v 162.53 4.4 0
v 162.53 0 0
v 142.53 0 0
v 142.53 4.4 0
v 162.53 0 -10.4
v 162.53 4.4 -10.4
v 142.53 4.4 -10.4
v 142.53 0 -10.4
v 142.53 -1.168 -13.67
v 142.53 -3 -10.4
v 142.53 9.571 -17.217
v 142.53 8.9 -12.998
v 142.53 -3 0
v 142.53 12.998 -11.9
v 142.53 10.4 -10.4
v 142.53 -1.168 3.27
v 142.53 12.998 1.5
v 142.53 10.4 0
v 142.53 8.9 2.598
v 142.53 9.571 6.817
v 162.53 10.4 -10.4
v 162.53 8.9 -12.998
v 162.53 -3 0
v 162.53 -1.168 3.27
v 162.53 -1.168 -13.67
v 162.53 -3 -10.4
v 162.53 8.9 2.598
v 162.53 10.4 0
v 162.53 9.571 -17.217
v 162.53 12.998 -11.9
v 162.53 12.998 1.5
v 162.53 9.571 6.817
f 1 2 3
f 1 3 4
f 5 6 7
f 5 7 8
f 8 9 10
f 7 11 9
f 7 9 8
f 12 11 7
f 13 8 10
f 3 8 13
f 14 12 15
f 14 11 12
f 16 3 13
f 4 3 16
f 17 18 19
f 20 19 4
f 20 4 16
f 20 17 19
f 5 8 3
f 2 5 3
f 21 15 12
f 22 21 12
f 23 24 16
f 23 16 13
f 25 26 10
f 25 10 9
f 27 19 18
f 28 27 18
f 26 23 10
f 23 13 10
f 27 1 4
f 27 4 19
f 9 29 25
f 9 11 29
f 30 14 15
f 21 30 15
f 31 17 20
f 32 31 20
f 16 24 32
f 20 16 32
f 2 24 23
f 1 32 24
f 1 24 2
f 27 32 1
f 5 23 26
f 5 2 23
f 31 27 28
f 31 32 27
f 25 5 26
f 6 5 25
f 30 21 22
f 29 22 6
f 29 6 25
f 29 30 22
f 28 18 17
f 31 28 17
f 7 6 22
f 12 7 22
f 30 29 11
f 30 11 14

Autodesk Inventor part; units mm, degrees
ref_plane "YZ Plane" through (0, 0, 0) normal (1, 0, 0) x (0, 1, 0)
ref_plane "XZ Plane" through (0, 0, 0) normal (0, 1, 0) x (-1, 0, 0)
ref_plane "XY Plane" through (0, 0, 0) normal (0, 0, 1) x (1, 0, 0)
sketch "Эскиз8" plane through (0, 0, 0) normal (1, 0, 0) x (0, 1, 0)
  line L0 (0, 0) -> (10.4, 0)
  line L1 (10.4, 0) -> (10.4, -10.4)
  line L2 (10.4, -10.4) -> (0, -10.4)
  line L3 (0, -10.4) -> (0, 0)
  line L4 (5.2, 0) -> (5.2, 4)
  line L5 (5.2, -10.4) -> (5.2, -14.4)
  circle A0 centre (5.2, 4) radius 1.6
  circle A1 centre (5.2, -14.4) radius 1.6
  line L6 (5.2, 4) -> (7.9, 4)
  line L7 (7.9, 2.4412) -> (5.2, 0.8823)
  line L8 (5.2, 0.8823) -> (2.5, 2.4412)
  line L9 (2.5, 2.4412) -> (2.5, 5.5588)
  line L10 (2.5, 5.5588) -> (5.2, 7.1177)
  line L11 (5.2, 7.1177) -> (7.9, 5.5588)
  line L12 (7.9, 5.5588) -> (7.9, 2.4412)
  line L13 (7.9, -15.9588) -> (5.2, -17.5177)
  line L14 (5.2, -17.5177) -> (2.5, -15.9588)
  line L15 (2.5, -15.9588) -> (2.5, -12.8412)
  line L16 (2.5, -12.8412) -> (5.2, -11.2823)
  line L17 (5.2, -11.2823) -> (7.9, -12.8412)
  line L18 (7.9, -12.8412) -> (7.9, -15.9588)
  circle A2 centre (5.2, 4) radius 5.2
  circle A3 centre (5.2, -14.4) radius 5.2
  line L19 (10.4, 4) -> (10.4, 0)
  line L20 (10.4, -10.4) -> (10.4, -14.4)
  line L21 (0, -14.4) -> (0, -10.4)
  line L22 (0, 4) -> (0, 0)
  line L23 (7.9, 5.5588) -> (7.9, 8.4441)
  line L24 (2.5, 5.5588) -> (2.5, 8.4441)
  line L25 (2.5, -15.9588) -> (2.5, -18.8441)
  line L26 (7.9, -15.9588) -> (7.9, -18.8441)
  line L27 (0, 0) -> (-3, 0)
  line L28 (-3, 0) -> (-3, -10.4)
  line L29 (-3, -10.4) -> (0, -10.4)
  line L30 (0, -10.4) -> (0, 0)
  line L31 (10.4, 0) -> (8.9, 2.5981)
  line L32 (10.4, -10.4) -> (8.9, -12.9981)
  line L33 (10.4, -10.4) -> (13.4, -10.4) construction
  line L34 (8.9, -12.9981) -> (4.4, -10.4)
  line L35 (8.9, 2.5981) -> (4.4, 0)
  line L36 (-3, 0) -> (0.663, 6.5408)
  line L37 (-3, -10.4) -> (0.663, -16.9408)
  line L38 (10.4, 0) -> (12.9981, 1.5)
  line L39 (12.9981, 1.5) -> (9.5707, 6.8173)
  line L40 (10.4, -10.4) -> (12.9981, -11.9)
  line L41 (12.9981, -11.9) -> (9.5707, -17.2173)
  point P0 (7.9, -14.4)
  dimension "d51" = 10.4
  dimension "d52" = 10.4
  dimension "d53" = 4
  dimension "d54" = 4
  dimension "d55" = 3.2
  dimension "d56" = 3.2
  dimension "d57" = 2.7
  dimension "d58" = 3
  dimension "d59" = 3
  dimension "d60" = 3
  dimension "d61" = 120
  dimension "d62" = 3
  dimension "d63" = 3
extrude "Выдавливание6" add sketch "Эскиз8" along normal blind 5 contours L0 A2 L24 L9 L8 L4 L35 | L0 L22 A2 | L4 L7 L12 L23 A2 L31 L35 | L27 L36 A2 L22 | L3 L29 L28 L27 | L31 A2 L19 | L19 A2 L39 L38 | L2 A3 L21 | L21 A3 L37 L29 | L40 L41 A3 L20 | L20 A3 L32 | L2 L34 L5 L16 L15 L25 A3 | A3 L26 L18 L17 L5 L34 L32
sketch "Эскиз9" plane through (0, 0, 0) normal (-1, 0, 0) x (0, 0, 1)
  arc A0 (-18.8441, 2.5) -> (-16.9408, 0.663) centre (-14.4, 5.2) ccw projected
  circle A1 centre (-14.4, 5.2) radius 5.2
  circle A2 centre (-14.4, 5.2) radius 1.6
  arc A3 (6.5408, 0.663) -> (8.4441, 2.5) centre (4, 5.2) ccw projected
  circle A4 centre (4, 5.2) radius 5.2
  circle A5 centre (4, 5.2) radius 1.6
  line L0 (2.5981, 8.9) -> (0, 10.4) projected
  line L1 (0, 10.4) -> (2.5981, 8.9)
  line L2 (0, 4.4) -> (2.5981, 8.9) projected
  line L3 (2.5981, 8.9) -> (0, 4.4)
  line L4 (0, 0) -> (0, 4.4) projected
  line L5 (0, 4.4) -> (0, 0)
  line L6 (-10.4, 4.4) -> (-10.4, 0) projected
  line L7 (0, 0) -> (-10.4, 0)
  line L8 (-10.4, 0) -> (-10.4, 1.8774)
  line L9 (-10.4, 10.4) -> (-12.9981, 8.9) projected
  line L10 (-11.699, 9.65) -> (-10.4, 10.4)
  line L11 (-11.9, 12.9981) -> (-10.4, 10.4) projected
  line L12 (-10.4, 10.4) -> (-11.9, 12.9981)
  line L13 (-17.2173, 9.5707) -> (-11.9, 12.9981) projected
  line L14 (-11.9, 12.9981) -> (-17.2173, 9.5707)
  line L15 (0, 10.4) -> (1.5, 12.9981) projected
  line L16 (0, 10.4) -> (1.5, 12.9981)
  line L17 (1.5, 12.9981) -> (6.8173, 9.5707) projected
  line L18 (1.5, 12.9981) -> (6.8173, 9.5707)
  line L19 (0, -3) -> (-10.4, -3) projected
  line L20 (0, -3) -> (6.5408, 0.663)
  line L21 (6.5408, 0.663) -> (0, -3) projected
  line L22 (-10.4, -3) -> (-16.9408, 0.663)
  line L23 (-10.4, -3) -> (-16.9408, 0.663) projected
  line L24 (-10.4, -3) -> (0, -3)
  line L25 (-10.4, 0) -> (0, 0) projected
  line L26 (0, 0) -> (-10.4, 0)
  line L27 (-10.4, 0) -> (-10.4, 1.8774)
  line L28 (0, 1.8774) -> (0, 0)
  line L29 (-11.699, 9.65) -> (-12.9981, 8.9)
  line L30 (-12.9981, 8.9) -> (-10.4, 4.4) projected
  line L31 (-10.4, 4.4) -> (-12.9981, 8.9)
  line L32 (-12.9981, 8.9) -> (-10.4, 4.4)
  line L33 (-10.4, 4.4) -> (-10.4, 1.8774)
  line L34 (0, 1.8774) -> (0, 4.4)
  line L35 (2.5981, 8.9) -> (0, 4.4)
  line L36 (1.299, 9.65) -> (2.5981, 8.9)
  point P0 (-18.8441, 2.5)
  point P1 (-16.9408, 0.663)
  point P2 (6.5408, 0.663)
  point P3 (8.4441, 2.5)
  dimension "d66" = 3.2
  dimension "d67" = 3.2
extrude "Выдавливание7" add sketch "Эскиз9" along normal blind 5 contours A1 L9 L30 L6 A0 | A1 L6 L7 L4 A4 L20 L19 L22 | L13 L11 L9 A1 | A4 L4 L2 L0 A3 | L0 L15 L17 A4
sketch "Эскиз10" plane through (5, 0, 0) normal (1, 0, 0) x (0, 0, -1)
  line L0 (-1.5, 12.9981) -> (-6.8173, 9.5707) projected
  line L1 (0, 10.4) -> (-1.5, 12.9981) projected
  line L2 (-1.5, 12.9981) -> (0, 10.4)
  line L3 (-2.5981, 8.9) -> (0, 10.4) projected
  line L4 (0, 10.4) -> (-2.5981, 8.9)
  line L5 (0, 4.4) -> (-2.5981, 8.9) projected
  line L6 (-2.5981, 8.9) -> (0, 4.4)
  line L7 (0, 0) -> (0, 4.4) projected
  line L8 (0, 4.4) -> (0, 0)
  line L9 (10.4, 0) -> (0, 0) projected
  line L10 (0, 0) -> (10.4, 0)
  line L11 (10.4, 4.4) -> (10.4, 0) projected
  line L12 (10.4, 0) -> (10.4, 4.4)
  line L13 (10.4, 10.4) -> (12.9981, 8.9) projected
  line L14 (10.4, 4.4) -> (12.9981, 8.9)
  line L15 (12.9981, 8.9) -> (10.4, 10.4)
  line L16 (11.9, 12.9981) -> (10.4, 10.4) projected
  line L17 (10.4, 10.4) -> (11.9, 12.9981)
  line L18 (17.2173, 9.5707) -> (11.9, 12.9981) projected
  line L19 (11.9, 12.9981) -> (17.2173, 9.5707)
  line L20 (17.2173, 9.5707) -> (13.6704, -1.1685)
  line L21 (10.4, -3) -> (16.9408, 0.663) projected
  line L22 (10.4, -3) -> (13.6704, -1.1685)
  line L23 (0, -3) -> (10.4, -3) projected
  line L24 (-6.5408, 0.663) -> (0, -3) projected
  line L25 (10.4, -3) -> (0, -3)
  arc A0 (-8.4441, 2.5) -> (-6.5408, 0.663) centre (-4, 5.2) ccw projected
  line L26 (0, -3) -> (-6.5408, 0.663)
  line L27 (-3.2704, -1.1685) -> (-6.8173, 9.5707)
  line L28 (-6.8173, 9.5707) -> (-1.5, 12.9981)
extrude "Выдавливание8" add sketch "Эскиз10" along normal blind 157.53
sketch "Эскиз13" plane through (162.53, 0, 0) normal (1, 0, 0) x (0, 0, -1)
  line L0 (-6.8173, 9.5707) -> (-1.5, 12.9981) projected
  line L1 (-1.5, 12.9981) -> (-6.8173, 9.5707)
  line L2 (-6.5408, 0.663) -> (-3.2704, -1.1685) projected
  line L3 (-6.8173, 9.5707) -> (-3.2704, -1.1685)
  line L4 (-3.2704, -1.1685) -> (0, -3)
  line L5 (10.4, -3) -> (0, -3) projected
  line L6 (0, -3) -> (10.4, -3)
  line L7 (16.9408, 0.663) -> (10.4, -3) projected
  line L8 (10.4, -3) -> (13.6704, -1.1685)
  line L9 (13.6704, -1.1685) -> (17.2173, 9.5707) projected
  line L10 (17.2173, 9.5707) -> (13.6704, -1.1685)
  arc A0 (16.9408, 0.663) -> (17.2173, 9.5707) centre (14.4, 5.2) ccw projected
  line L11 (17.2173, 9.5707) -> (11.9, 12.9981) projected
  line L12 (17.2173, 9.5707) -> (11.9, 12.9981)
  line L13 (11.9, 12.9981) -> (10.4, 10.4) projected
  line L14 (11.9, 12.9981) -> (10.4, 10.4)
  line L15 (10.4, 10.4) -> (12.9981, 8.9) projected
  line L16 (10.4, 10.4) -> (12.9981, 8.9)
  line L17 (12.9981, 8.9) -> (10.4, 4.4)
  line L18 (10.4, 4.4) -> (12.9981, 8.9) projected
  line L19 (0, 0) -> (10.4, 0) projected
  line L20 (10.4, 4.4) -> (10.4, 0)
  line L21 (10.4, 0) -> (0, 0)
  line L22 (0, 4.4) -> (0, 0) projected
  line L23 (0, 0) -> (0, 4.4)
  line L24 (0, 10.4) -> (-2.5981, 8.9) projected
  line L25 (0, 4.4) -> (-2.5981, 8.9)
  line L26 (-2.5981, 8.9) -> (0, 10.4)
  line L27 (-1.5, 12.9981) -> (0, 10.4) projected
  line L28 (0, 10.4) -> (-1.5, 12.9981)
  line L29 (-1.5, 12.9981) -> (11.9, 12.9981)
  line L30 (11.9, 12.9981) -> (11.9, 16.9981)
  line L31 (-1.5, 16.9981) -> (-1.5, 12.9981)
  line L32 (-1.5, 16.9981) -> (0, 16.9981)
  line L33 (0, 20.9981) -> (0, 22.9981)
  line L34 (-1, 23.9981) -> (-0.6923, 23.9981)
  line L35 (-1.5, 21.2778) -> (-1.5, 16.9981)
  line L36 (11.9, 16.9981) -> (10.4, 16.9981)
  line L37 (10.4, 20.9981) -> (10.4, 22.9981)
  line L38 (11.4, 23.9981) -> (11.0923, 23.9981)
  line L39 (11.9, 21.2778) -> (11.9, 16.9981)
  line L40 (-1.5, 23.9981) -> (-1.5, 22.4981)
  line L41 (-6.8173, 9.5707) -> (-3.2704, -1.1685) projected
  arc A1 (-2.3689, 21.6153) -> (-6.8173, 9.5707) centre (10.1732, 10.1395) ccw
  arc A2 (17.2173, 9.5707) -> (12.7689, 21.6153) centre (0.2268, 10.1395) ccw
  line L42 (11.9, 12.9981) -> (19.7387, 7.9454)
  line L43 (-1.5, 12.9981) -> (-9.3387, 7.9454)
  arc A3 (-2.1057, 23.413) -> (-9.3387, 7.9454) centre (15.5626, 5.726) ccw
  arc A4 (19.7387, 7.9454) -> (12.5057, 23.413) centre (-5.1626, 5.726) ccw
  line L44 (13.6704, -1.1685) -> (16.2685, -2.6685)
  line L45 (13.6704, -1.1685) -> (16.6704, -1.1685) construction
  line L46 (-3.2704, -1.1685) -> (-5.8685, -2.6685)
  line L47 (-3.2704, -1.1685) -> (-0.2704, -1.1685) construction
  line L48 (0, -3) -> (-6.5408, 0.663) projected
  line L49 (0, -3) -> (-3.7158, -6.3971)
  line L50 (10.4, -3) -> (14.1158, -6.3971)
  spline S0 degree 2 poles (-1.6495, -2.0762) (-2.6908, -8.8998) (-6.9021, -5.2438) knots 0 0 0 1 1 1
  spline S1 degree 2 poles (12.0352, -2.0842) (13.0969, -8.8932) (17.2999, -5.2483) knots 0 0 0 1 1 1
  arc A5 (-9.3387, 7.9454) -> (-6.9021, -5.2438) centre (15.5626, 5.726) ccw
  arc A6 (17.2999, -5.2483) -> (19.7387, 7.9454) centre (-5.1626, 5.726) ccw
  arc A7 (12.7689, 21.6153) -> (11.9, 21.2778) centre (12.4, 21.2778) ccw
  arc A8 (-1.5, 21.2778) -> (-2.3689, 21.6153) centre (-2, 21.2778) ccw
  arc A9 (-0.6923, 23.9981) -> (-2.1057, 23.413) centre (-0.6923, 21.9981) ccw
  arc A10 (12.5057, 23.413) -> (11.0923, 23.9981) centre (11.0923, 21.9981) ccw
  arc A11 (11.4, 23.9981) -> (10.4, 22.9981) centre (11.4, 22.9981) ccw
  arc A12 (0, 22.9981) -> (-1, 23.9981) centre (-1, 22.9981) ccw
  line L51 (1, 19.9981) -> (9.4, 19.9981)
  line L52 (10.4, 16.9981) -> (9.687, 16.9981)
  line L53 (9.687, 16.9981) -> (0, 16.9981)
  arc A13 (0, 20.9981) -> (1, 19.9981) centre (1, 20.9981) ccw
  arc A14 (9.4, 19.9981) -> (10.4, 20.9981) centre (9.4, 20.9981) ccw
  point P0 (0, 23.9981)
  point P1 (10.4, 23.9981)
  point P2 (11.9, 23.9981)
  point P3 (11.9, 22.4981)
  point P4 (0, 19.9981)
  point P5 (10.4, 19.9981)
  point P6 (-6.9021, -5.2438)
  point P7 (-2.7015, -5.4698)
  point P8 (-1.6495, -2.0762)
  point P9 (12.0352, -2.0842)
  point P10 (13.0907, -5.4599)
  point P11 (11.2726, 23.9899)
  point P12 (-0.8726, 23.9899)
  dimension "d78" = 4
  dimension "d80" = 1.5
  dimension "d81" = 1.5
  dimension "d82" = 17
  dimension "d83" = 17
  dimension "d85" = 9.326
  dimension "d86" = 9.326
  dimension "d87" = 25
  dimension "d88" = 25
  dimension "d89" = 3
  dimension "d90" = 30
  dimension "d91" = 3
  dimension "d92" = 150
  dimension "d94" = 0.5
  dimension "d95" = 2
  dimension "d96" = 1
  dimension "d99" = 1
extrude "Выдавливание10" add sketch "Эскиз13" along normal blind 10 contours L43 A3 A9 A12 L33 A13 L51 A14 L37 A11 A10 A4 L42 A2 A7 L39 L36 L52 L53 L32 L35 A8 A1 | L3 L4 S0 L49 A5 L43 | A0 L7 L9 | L42 A6 S1 L50 L7 A0 | S0 L49 | L50 S1
sketch "Эскиз15" plane through (172.53, 0, 0) normal (1, 0, 0) x (0, 0, -1)
  arc A0 (-8.4441, 2.5) -> (-6.5408, 0.663) centre (-4, 5.2) ccw projected
  arc A1 (-2.1057, 23.413) -> (-6.9021, -5.2438) centre (15.5626, 5.726) ccw projected
  spline S0 degree 2 poles (-1.6495, -2.0762) (-9.2024, -10.4533) (-8.4441, 2.5) knots 0 0 0 1 1 1
  line L0 (10.4, -3) -> (12.0352, -2.0842) projected
  line L1 (18.8441, 2.5) -> (14.882, 2.5) projected
  arc A2 (17.2999, -5.2483) -> (12.5057, 23.413) centre (-5.1626, 5.726) ccw projected
  spline S1 degree 2 poles (12.0352, -2.0842) (19.6046, -10.4586) (18.8441, 2.5) knots 0 0 0 1 1 1
  line L2 (18.6354, -3) -> (19.4948, 1.6016)
  line L3 (-8.235, -3) -> (-9.0948, 1.6016)
  line L4 (-1.6495, -2.0762) -> (-3.2704, -1.1685) projected
  spline S2 degree 2 poles (-1.6495, -2.0762) (-2.6908, -8.8998) (-6.9021, -5.2438) knots 0 0 0 1 1 1
  spline S3 degree 2 poles (12.0352, -2.0842) (13.0969, -8.8932) (17.2999, -5.2483) knots 0 0 0 1 1 1
  point P0 (0, 0)
  point P1 (-3.7158, -6.3971)
  point P2 (14.1158, -6.3971)
extrude "Выдавливание11" cut sketch "Эскиз15" against normal blind 10
sketch "Эскиз16" plane through (172.53, 0, 0) normal (1, 0, 0) x (0, 0, -1)
  line L0 (-1.6495, -2.0762) -> (-3.2704, -1.1685) projected
  line L1 (-2.4412, 2.5) -> (-8.4441, 2.5) projected
  arc A0 (-2.1057, 23.413) -> (-6.9021, -5.2438) centre (15.5626, 5.726) ccw projected
  spline S0 degree 2 poles (-1.6495, -2.0762) (-9.2024, -10.4533) (-8.4441, 2.5) knots 0 0 0 1 1 1
  line L2 (13.6704, -1.1685) -> (12.0352, -2.0842) projected
  arc A1 (16.9408, 0.663) -> (18.8441, 2.5) centre (14.4, 5.2) ccw projected
  arc A2 (17.2999, -5.2483) -> (12.5057, 23.413) centre (-5.1626, 5.726) ccw projected
  spline S1 degree 2 poles (12.0352, -2.0842) (19.6046, -10.4586) (18.8441, 2.5) knots 0 0 0 1 1 1
  line L3 (-1.6495, -2.0762) -> (0, -3) projected
  line L4 (-1.6495, -2.0762) -> (-8.4702, -1.1606)
  line L5 (12.0352, -2.0842) -> (18.8706, -1.1592)
  line L6 (-8.235, -3) -> (-9.0071, 1.1077)
  line L7 (18.6354, -3) -> (19.4075, 1.1099)
  point P0 (0, 0)
  point P1 (18.7195, -2.5523)
  point P2 (-8.319, -2.5532)
extrude "Выдавливание12" add sketch "Эскиз16" against normal blind 10
sketch "Эскиз17" plane through (-5, 0, 0) normal (-1, 0, 0) x (0, 0, 1)
  line L0 (-37.7292, 41.1824) -> (41.3103, 41.1824)
  line L1 (41.3103, 41.1824) -> (41.3103, -34.7876)
  line L2 (41.3103, -34.7876) -> (-37.7292, -34.7876)
  line L3 (-37.7292, -34.7876) -> (-37.7292, 41.1824)
  point P0 (0, 0)
extrude "Выдавливание13" cut sketch "Эскиз17" against normal blind 147.53
sketch "Эскиз18" plane through (172.53, 0, 0) normal (1, 0, 0) x (0, 0, -1)
  line L0 (-31.4647, -11.5956) -> (67.799, -11.5956)
  line L1 (67.799, -11.5956) -> (67.799, 38.6102)
  line L2 (67.799, 38.6102) -> (-31.4647, 38.6102)
  line L3 (-31.4647, 38.6102) -> (-31.4647, -11.5956)
  point P0 (0, 0)
extrude "Выдавливание14" cut sketch "Эскиз18" against normal blind 10
properties part number "защёлка_выдача"
